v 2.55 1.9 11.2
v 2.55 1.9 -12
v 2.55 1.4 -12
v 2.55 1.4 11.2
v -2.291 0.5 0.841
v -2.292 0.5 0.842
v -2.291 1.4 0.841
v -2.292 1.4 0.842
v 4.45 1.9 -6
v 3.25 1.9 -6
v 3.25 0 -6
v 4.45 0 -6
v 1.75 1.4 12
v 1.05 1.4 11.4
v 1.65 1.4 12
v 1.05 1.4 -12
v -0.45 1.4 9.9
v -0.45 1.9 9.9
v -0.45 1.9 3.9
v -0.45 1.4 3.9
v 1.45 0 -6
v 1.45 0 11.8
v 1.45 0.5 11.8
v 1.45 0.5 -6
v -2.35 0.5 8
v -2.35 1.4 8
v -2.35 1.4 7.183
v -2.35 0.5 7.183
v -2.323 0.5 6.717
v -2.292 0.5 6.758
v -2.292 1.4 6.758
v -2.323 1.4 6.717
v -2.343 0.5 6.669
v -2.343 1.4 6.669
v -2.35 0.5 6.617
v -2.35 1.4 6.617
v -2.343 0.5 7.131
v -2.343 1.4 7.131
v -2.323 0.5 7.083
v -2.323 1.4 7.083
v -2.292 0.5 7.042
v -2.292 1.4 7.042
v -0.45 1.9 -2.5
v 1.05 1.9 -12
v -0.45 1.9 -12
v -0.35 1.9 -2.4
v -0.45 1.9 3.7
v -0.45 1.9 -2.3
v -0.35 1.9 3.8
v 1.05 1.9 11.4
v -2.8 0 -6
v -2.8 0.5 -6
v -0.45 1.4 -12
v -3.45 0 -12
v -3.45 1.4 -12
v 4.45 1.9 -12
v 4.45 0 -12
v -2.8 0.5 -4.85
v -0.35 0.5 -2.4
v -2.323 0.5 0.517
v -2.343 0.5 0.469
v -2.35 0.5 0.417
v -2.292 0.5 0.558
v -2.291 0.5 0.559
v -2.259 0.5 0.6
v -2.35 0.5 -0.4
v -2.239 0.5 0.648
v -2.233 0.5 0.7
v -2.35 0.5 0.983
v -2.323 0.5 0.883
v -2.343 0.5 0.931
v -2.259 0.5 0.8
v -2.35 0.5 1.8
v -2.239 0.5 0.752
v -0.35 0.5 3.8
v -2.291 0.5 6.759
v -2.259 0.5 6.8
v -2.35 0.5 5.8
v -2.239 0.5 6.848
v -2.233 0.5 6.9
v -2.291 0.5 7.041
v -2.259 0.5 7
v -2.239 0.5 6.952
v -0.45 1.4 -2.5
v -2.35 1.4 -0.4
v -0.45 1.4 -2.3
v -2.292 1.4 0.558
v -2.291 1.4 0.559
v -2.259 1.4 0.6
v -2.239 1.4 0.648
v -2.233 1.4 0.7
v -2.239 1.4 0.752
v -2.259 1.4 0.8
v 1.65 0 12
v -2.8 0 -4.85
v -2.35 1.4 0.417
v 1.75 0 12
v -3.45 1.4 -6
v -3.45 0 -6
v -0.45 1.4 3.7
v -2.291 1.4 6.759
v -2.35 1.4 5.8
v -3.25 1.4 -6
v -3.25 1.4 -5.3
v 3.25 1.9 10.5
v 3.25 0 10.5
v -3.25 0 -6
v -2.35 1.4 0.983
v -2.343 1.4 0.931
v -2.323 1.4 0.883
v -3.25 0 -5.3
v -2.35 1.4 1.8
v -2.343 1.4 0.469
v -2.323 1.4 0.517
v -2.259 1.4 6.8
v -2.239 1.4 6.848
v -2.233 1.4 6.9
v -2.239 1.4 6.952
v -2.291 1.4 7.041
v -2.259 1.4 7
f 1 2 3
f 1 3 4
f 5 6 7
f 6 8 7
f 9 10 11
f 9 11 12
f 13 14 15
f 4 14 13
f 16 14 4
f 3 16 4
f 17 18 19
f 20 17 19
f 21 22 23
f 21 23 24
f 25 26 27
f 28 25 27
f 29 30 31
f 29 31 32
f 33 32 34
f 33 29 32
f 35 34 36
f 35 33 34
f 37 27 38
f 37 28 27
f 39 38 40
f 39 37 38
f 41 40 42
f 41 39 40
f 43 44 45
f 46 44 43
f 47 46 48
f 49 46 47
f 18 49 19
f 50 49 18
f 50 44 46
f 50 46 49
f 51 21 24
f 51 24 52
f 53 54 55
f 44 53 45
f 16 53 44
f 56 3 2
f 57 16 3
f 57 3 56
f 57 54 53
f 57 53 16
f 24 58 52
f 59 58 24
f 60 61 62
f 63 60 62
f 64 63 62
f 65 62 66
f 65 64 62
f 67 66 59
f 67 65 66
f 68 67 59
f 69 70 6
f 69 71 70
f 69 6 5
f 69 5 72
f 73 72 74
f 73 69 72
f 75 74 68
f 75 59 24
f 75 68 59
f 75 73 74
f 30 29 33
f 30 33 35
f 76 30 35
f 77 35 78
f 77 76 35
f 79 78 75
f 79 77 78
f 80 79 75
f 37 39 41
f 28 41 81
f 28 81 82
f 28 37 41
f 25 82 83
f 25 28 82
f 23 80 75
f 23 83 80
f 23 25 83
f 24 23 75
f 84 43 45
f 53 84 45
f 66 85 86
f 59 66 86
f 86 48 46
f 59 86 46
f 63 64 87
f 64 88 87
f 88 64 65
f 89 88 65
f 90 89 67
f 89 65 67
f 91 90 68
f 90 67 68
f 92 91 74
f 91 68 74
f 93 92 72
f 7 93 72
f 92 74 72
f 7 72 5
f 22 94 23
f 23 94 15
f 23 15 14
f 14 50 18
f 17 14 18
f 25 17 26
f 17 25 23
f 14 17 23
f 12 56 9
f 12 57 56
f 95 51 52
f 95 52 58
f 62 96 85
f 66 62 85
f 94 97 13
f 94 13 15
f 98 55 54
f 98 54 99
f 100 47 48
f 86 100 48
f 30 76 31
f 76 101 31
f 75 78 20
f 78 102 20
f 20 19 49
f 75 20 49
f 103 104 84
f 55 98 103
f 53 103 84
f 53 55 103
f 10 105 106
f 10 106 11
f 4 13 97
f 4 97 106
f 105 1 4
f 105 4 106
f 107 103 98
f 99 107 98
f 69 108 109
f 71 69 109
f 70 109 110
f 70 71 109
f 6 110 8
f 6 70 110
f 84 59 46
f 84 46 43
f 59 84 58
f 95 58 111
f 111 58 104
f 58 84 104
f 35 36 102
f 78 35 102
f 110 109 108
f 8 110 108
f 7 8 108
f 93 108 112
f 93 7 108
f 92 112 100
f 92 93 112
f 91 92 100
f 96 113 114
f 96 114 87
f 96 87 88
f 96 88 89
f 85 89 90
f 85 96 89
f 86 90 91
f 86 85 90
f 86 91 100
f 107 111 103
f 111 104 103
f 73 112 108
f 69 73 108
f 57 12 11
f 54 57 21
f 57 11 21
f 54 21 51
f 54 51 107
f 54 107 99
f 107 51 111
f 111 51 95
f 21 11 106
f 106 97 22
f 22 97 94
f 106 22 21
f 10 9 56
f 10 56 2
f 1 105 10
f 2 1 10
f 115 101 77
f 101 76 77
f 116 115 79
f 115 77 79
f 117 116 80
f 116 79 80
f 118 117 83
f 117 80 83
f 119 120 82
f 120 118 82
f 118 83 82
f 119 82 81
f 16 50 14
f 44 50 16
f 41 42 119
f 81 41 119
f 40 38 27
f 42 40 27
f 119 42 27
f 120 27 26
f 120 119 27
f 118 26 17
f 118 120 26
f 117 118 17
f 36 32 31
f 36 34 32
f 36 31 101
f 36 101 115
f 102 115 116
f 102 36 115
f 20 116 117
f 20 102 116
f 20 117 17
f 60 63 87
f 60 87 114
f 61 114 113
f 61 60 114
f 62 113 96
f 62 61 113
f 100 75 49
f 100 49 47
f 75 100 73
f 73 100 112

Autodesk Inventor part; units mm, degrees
ref_plane "YZ Plane" through (0, 0, 0) normal (1, 0, 0) x (0, 1, 0)
ref_plane "XZ Plane" through (0, 0, 0) normal (0, 1, 0) x (-1, 0, 0)
ref_plane "XY Plane" through (0, 0, 0) normal (0, 0, 1) x (1, 0, 0)
sketch "スケッチ1" plane through (0, 0, 0) normal (0, 1, 0) x (-1, 0, 0)
  line L0 (-4.45, 12) -> (4.45, 12)
  line L1 (4.45, 12) -> (4.45, -12)
  line L2 (4.45, -12) -> (-4.45, -12)
  line L3 (-4.45, -12) -> (-4.45, 12)
  point P0 (0, 0)
  dimension "d0" = 8.9
  dimension "d2" = 24
  dimension "d3" = 4.45
  dimension "d4" = 12
extrude "押し出し1" add sketch "スケッチ1" along normal blind 1.9
sketch "スケッチ4" plane through (0, 0, 0) normal (0, -1, 0) x (1, 0, 0)
  line L0 (4.45, 12) -> (-4.45, 12) projected
  line L1 (-4.45, -12) -> (4.45, -12) projected
  line L2 (4.45, -12) -> (4.45, 12) projected
  line L3 (-2.8, 12) -> (1.45, 12)
  line L4 (1.45, 12) -> (1.45, -6)
  line L5 (1.45, -6) -> (-2.8, -6)
  line L6 (-2.8, -6) -> (-2.8, 12)
  point P0 (0, 0)
  dimension "d39" = 6
  dimension "d40" = 4.25
  dimension "d41" = 3
extrude "押し出し3" cut sketch "スケッチ4" against normal blind 0.5
sketch "スケッチ3" plane through (0, 1.9, 0) normal (0, 1, 0) x (1, 0, 0)
  line L0 (-4.45, -12) -> (4.45, -12) projected
  line L1 (4.45, 12) -> (-4.45, 12) projected
  line L2 (-4.45, 12) -> (-4.45, -12) projected
  line L3 (-3.45, -12) -> (-0.45, -12)
  line L4 (-0.45, -12) -> (-0.45, 12)
  line L5 (-0.45, 12) -> (-3.45, 12)
  line L6 (-3.45, 12) -> (-3.45, -12)
  line L7 (1.05, 12) -> (2.55, 12)
  line L8 (2.55, 12) -> (2.55, -12)
  line L9 (2.55, -12) -> (1.05, -12)
  line L10 (1.05, -12) -> (1.05, 12)
  point P0 (0, 0)
  dimension "d35" = 1
  dimension "d36" = 3
  dimension "d37" = 1.5
  dimension "d38" = 1.5
extrude "押し出し4" cut sketch "スケッチ3" against normal blind 0.5 contours L6 L1 L4 L0 | L10 L1 L8 L0
sketch "スケッチ2" plane through (0, 1.9, 0) normal (0, 1, 0) x (1, 0, 0)
  line L0 (-4.45, -12) -> (4.45, -12) projected
  line L1 (4.45, 12) -> (-4.45, 12) projected
  line L2 (-4.45, 12) -> (-4.45, -12) projected
  line L3 (-4.45, -12) -> (-3.25, -12)
  line L4 (-3.25, -12) -> (-3.25, 6)
  line L5 (-3.25, 6) -> (-4.45, 6)
  line L6 (-4.45, 6) -> (-4.45, -12)
  line L7 (4.45, -12) -> (3.25, -12)
  line L8 (3.25, -12) -> (3.25, 6)
  line L9 (3.25, 6) -> (4.45, 6)
  line L10 (4.45, 6) -> (4.45, -12)
  line L11 (1.75, -12) -> (3.25, -10.5)
  line L12 (-2.35, -12) -> (-2.35, 6)
  line L13 (-2.35, 6) -> (-3.25, 6)
  line L14 (1.65, -12) -> (-2.35, -8)
  line L15 (-2.35, -7.1) -> (-2.15, -6.9)
  line L16 (-2.15, -6.9) -> (-2.35, -6.7)
  line L17 (-2.35, -5.8) -> (-0.35, -3.8)
  line L18 (-0.35, -3.8) -> (-2.35, -1.8)
  line L19 (-2.35, -0.9) -> (-2.15, -0.7)
  line L20 (-2.15, -0.7) -> (-2.35, -0.5)
  line L21 (-2.35, 0.4) -> (-0.35, 2.4)
  line L22 (-0.35, 2.4) -> (-3.25, 5.3)
  line L23 (1.65, -12) -> (1.75, -12)
  line L24 (2.55, -12) -> (2.55, 12) projected
  line L25 (2.55, 12) -> (4.45, 12) projected
  line L26 (4.45, 12) -> (4.45, -12) projected
  line L27 (4.45, -12) -> (2.55, -12) projected
  line L28 (-0.45, -12) -> (-0.45, 12) projected
  line L29 (-0.45, 12) -> (1.05, 12) projected
  line L30 (1.05, 12) -> (1.05, -12) projected
  line L31 (1.05, -12) -> (-0.45, -12) projected
  line L32 (-3.45, 12) -> (-3.45, -12) projected
  line L33 (-3.45, -12) -> (-4.45, -12) projected
  line L34 (-4.45, -12) -> (-4.45, 12) projected
  line L35 (-4.45, 12) -> (-3.45, 12) projected
  point P0 (0, 0)
  dimension "d7" = 6.5
  dimension "d9" = 1.2
  dimension "d10" = 6
  dimension "d11" = 6
  dimension "d12" = 1.5
  dimension "d13" = 1.5
  dimension "d20" = 5.6
  dimension "d22" = 4
  dimension "d23" = 4
  dimension "d24" = 0.2
  dimension "d25" = 0.9
  dimension "d26" = 0.9
  dimension "d27" = 2
  dimension "d28" = 0.2
  dimension "d29" = 0.9
  dimension "d30" = 2
  dimension "d31" = 0.9
  dimension "d32" = 135
extrude "押し出し5" cut sketch "スケッチ2" against normal blind 2 contours L32 L1 L28 L22 L12 L13 L5 | L4 L13 L12 L22 | L12 L15 L16 L17 L28 L14 | L1 L30 L14 L28 L17 L18 L21 L22 | L21 L28 L18 L12 L19 L20 | L1 L24 L11 L0 L14 L30 | L1 L26 L9 L8 L11 L24 keep common part
fillet "フィレット1" radius 0.2 6 edges at (-2.15, 0.95, 0.7) (-2.15, 0.95, 6.9) (-2.35, 0.95, 0.5) (-2.35, 0.95, 0.9) (-2.35, 0.95, 6.7) (-2.35, 0.95, 7.1)
properties part number "key"
